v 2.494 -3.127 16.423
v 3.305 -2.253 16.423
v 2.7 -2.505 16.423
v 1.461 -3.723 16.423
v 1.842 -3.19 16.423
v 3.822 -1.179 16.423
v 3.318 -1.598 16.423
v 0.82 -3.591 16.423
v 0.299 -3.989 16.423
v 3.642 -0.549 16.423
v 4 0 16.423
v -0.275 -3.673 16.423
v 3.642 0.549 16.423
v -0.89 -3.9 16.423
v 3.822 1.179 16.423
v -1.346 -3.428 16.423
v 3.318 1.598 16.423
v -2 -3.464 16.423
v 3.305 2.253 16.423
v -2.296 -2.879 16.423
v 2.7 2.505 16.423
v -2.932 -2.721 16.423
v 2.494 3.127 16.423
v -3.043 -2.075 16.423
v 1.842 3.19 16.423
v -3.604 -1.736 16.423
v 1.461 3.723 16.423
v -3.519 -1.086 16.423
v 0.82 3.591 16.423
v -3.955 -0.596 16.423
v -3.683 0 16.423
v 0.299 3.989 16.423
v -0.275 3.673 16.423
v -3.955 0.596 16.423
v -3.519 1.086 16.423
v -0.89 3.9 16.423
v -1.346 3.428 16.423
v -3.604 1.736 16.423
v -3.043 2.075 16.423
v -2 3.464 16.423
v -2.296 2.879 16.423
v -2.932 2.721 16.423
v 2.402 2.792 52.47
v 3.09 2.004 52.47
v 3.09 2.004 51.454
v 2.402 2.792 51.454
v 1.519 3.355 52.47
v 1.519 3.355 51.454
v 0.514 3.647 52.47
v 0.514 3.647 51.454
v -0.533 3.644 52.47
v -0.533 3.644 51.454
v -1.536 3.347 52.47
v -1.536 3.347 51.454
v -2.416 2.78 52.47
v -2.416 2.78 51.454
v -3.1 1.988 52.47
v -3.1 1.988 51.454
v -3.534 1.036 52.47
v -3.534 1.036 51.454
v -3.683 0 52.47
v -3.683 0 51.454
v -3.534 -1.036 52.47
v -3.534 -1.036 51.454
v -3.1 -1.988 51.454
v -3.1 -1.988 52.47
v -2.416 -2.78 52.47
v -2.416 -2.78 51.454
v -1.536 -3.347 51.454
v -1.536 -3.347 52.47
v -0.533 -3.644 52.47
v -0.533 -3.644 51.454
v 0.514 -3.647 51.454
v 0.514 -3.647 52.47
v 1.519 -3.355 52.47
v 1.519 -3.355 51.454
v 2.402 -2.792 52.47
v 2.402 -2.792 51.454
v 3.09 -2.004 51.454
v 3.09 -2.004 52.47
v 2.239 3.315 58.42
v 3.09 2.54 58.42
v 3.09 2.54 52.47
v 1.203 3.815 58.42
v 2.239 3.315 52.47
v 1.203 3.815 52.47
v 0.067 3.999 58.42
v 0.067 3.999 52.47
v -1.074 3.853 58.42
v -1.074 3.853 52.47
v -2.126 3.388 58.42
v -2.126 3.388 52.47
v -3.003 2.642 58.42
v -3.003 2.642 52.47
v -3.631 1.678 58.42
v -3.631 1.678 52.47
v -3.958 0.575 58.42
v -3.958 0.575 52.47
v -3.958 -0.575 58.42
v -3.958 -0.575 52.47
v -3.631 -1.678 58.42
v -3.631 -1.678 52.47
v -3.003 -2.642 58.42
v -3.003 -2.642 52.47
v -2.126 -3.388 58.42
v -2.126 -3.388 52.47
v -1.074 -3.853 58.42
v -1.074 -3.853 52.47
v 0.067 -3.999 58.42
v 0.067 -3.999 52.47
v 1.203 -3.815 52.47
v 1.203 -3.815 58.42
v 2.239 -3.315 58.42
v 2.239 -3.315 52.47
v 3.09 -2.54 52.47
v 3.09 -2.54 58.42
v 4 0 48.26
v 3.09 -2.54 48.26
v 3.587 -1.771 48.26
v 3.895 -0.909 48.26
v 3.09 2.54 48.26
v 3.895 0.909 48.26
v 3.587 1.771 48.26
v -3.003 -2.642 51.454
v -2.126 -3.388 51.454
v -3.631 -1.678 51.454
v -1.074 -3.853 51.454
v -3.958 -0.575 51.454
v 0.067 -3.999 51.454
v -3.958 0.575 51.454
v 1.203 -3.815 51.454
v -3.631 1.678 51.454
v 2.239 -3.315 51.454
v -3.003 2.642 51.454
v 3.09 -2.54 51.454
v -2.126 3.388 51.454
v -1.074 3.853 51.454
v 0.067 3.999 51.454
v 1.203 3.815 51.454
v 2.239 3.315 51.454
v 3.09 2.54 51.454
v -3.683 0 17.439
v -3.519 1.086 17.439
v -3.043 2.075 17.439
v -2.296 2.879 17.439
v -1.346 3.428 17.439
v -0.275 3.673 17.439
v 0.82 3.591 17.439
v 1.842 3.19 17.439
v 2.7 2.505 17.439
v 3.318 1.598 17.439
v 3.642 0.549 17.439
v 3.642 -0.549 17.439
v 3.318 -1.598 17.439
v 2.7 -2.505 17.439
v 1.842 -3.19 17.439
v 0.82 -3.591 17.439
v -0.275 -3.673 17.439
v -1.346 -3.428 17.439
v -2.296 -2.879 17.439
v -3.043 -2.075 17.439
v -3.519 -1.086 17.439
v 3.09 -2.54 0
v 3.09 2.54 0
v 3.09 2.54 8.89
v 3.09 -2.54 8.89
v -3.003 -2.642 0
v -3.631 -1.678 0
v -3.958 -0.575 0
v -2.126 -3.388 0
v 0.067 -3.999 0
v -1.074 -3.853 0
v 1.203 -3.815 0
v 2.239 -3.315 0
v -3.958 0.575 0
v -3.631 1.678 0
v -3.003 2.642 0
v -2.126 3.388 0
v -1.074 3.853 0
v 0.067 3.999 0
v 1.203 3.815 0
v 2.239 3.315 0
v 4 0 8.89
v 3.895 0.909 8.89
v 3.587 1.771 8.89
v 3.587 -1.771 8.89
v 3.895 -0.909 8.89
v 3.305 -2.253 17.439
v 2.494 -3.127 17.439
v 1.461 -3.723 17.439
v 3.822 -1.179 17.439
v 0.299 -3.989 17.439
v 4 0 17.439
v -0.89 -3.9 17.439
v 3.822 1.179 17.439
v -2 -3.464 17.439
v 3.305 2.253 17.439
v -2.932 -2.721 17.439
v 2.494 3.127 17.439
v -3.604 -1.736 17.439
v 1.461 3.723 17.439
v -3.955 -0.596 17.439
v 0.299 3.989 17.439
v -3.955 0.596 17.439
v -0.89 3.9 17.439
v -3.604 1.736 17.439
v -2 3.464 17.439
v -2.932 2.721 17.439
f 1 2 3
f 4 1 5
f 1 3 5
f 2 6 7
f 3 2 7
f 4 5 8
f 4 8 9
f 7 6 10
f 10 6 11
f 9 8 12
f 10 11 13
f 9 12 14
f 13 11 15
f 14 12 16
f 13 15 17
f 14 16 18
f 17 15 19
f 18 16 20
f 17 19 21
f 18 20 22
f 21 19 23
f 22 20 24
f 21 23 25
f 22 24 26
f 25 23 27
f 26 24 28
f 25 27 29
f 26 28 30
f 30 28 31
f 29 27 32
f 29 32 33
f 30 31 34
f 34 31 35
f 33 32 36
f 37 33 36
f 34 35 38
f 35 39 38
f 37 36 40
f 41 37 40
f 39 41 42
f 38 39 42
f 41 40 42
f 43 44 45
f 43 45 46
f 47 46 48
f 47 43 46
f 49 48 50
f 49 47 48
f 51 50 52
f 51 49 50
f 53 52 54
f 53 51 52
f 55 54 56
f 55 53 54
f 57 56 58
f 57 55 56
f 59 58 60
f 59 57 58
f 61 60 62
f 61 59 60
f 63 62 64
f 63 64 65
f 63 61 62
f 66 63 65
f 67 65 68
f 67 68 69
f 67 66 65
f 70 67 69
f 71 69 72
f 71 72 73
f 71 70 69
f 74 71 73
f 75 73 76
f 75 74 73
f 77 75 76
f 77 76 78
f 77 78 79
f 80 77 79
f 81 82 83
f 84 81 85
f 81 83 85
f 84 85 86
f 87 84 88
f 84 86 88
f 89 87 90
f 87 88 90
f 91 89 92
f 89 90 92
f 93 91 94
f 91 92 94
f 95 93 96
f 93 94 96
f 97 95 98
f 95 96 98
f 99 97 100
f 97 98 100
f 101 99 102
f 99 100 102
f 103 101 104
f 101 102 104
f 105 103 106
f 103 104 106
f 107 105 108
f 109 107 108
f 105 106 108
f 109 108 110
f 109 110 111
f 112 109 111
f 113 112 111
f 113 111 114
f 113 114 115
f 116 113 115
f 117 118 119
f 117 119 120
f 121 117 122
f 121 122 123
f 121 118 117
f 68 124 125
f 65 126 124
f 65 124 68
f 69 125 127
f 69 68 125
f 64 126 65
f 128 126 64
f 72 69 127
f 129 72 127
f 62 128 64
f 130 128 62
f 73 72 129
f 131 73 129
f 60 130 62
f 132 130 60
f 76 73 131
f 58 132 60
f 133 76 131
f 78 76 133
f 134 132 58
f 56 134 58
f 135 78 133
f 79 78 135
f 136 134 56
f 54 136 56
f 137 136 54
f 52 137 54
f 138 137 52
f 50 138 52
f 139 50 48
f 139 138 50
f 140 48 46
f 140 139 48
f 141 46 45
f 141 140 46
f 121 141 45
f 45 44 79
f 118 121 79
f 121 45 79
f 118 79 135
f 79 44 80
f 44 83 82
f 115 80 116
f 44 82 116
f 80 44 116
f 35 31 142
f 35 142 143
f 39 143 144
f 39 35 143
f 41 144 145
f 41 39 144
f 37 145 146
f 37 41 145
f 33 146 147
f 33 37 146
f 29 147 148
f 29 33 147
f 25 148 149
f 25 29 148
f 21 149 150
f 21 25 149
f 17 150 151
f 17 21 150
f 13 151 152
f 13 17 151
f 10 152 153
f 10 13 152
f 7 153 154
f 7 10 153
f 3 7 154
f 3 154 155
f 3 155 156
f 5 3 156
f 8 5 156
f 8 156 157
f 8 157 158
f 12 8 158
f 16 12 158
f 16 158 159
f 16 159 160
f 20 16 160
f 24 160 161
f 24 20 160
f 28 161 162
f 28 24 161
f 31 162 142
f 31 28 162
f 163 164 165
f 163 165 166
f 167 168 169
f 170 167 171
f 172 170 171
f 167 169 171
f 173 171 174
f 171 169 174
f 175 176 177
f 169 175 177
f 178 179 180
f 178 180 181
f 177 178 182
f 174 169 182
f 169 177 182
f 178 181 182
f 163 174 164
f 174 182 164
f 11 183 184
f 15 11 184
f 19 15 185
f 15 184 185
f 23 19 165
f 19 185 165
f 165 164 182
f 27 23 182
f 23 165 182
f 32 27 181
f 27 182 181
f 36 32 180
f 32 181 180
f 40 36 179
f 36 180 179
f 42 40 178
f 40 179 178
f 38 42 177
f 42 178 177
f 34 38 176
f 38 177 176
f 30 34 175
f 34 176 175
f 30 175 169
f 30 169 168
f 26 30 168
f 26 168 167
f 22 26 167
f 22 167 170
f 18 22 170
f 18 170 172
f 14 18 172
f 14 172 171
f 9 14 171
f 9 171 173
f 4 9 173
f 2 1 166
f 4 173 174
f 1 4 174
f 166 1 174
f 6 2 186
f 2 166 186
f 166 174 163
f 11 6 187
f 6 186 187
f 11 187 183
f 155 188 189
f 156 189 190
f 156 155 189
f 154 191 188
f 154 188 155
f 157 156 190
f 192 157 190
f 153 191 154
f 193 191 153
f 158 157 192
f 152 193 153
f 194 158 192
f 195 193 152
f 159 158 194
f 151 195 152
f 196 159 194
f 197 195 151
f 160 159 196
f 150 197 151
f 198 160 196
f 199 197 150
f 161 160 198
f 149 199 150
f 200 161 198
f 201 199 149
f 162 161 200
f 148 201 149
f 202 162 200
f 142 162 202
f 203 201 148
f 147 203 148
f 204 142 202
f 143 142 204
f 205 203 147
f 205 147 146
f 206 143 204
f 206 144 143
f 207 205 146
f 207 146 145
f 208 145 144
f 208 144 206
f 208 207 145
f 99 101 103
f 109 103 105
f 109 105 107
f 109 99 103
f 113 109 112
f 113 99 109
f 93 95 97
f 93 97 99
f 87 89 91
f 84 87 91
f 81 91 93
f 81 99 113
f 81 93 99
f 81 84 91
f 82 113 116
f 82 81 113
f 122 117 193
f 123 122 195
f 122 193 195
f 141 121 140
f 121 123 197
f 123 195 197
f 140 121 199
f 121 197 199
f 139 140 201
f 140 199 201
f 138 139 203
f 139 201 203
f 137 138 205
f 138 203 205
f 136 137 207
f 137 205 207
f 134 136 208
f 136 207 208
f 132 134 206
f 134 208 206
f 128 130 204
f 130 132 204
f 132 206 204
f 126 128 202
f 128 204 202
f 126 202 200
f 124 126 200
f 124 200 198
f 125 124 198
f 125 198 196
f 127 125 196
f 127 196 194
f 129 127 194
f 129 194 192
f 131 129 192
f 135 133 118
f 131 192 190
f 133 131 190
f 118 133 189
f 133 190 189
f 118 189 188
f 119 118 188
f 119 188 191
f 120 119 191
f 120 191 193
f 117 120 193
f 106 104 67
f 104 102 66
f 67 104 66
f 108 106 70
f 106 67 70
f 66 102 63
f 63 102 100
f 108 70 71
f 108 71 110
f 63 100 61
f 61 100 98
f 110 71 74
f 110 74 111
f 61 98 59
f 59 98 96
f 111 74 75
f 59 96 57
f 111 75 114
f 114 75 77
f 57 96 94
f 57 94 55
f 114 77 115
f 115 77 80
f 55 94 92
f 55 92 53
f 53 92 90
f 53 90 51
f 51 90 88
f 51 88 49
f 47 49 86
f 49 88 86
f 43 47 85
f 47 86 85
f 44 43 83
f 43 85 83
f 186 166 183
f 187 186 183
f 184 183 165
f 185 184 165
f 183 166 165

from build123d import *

# Parameters (mm, degrees)
SKETCH1_R           = 4.000000001
BOSS_EXTRUDE1_DEPTH = 58.42
CUT_EXTRUDE1_DEPTH  = 10.16
CUT_EXTRUDE5_DEPTH  = 8.89
CUT_EXTRUDE3_START  = -16.423386
SKETCH4_OUTSIDE_W   = 21.902
SKETCH4_OUTSIDE_H   = 21.902
SKETCH4_OUTSIDE_R   = 3.683
CUT_EXTRUDE3_DEPTH  = 1.016
CUT_EXTRUDE4_START  = -5.94995
SKETCH5_OUTSIDE_W   = 21.902
SKETCH5_OUTSIDE_H   = 21.902
SKETCH5_OUTSIDE_R   = 3.683
CUT_EXTRUDE4_DEPTH  = 1.016


with BuildPart() as part:
    # Sketch1 → Boss-Extrude1 (new body)
    with BuildSketch(Plane.XY):
        Circle(SKETCH1_R)
    extrude(amount=BOSS_EXTRUDE1_DEPTH)

    # Sketch2 → Cut-Extrude1 (cut)
    with BuildSketch(Plane.XY.offset(58.42)):
        with BuildLine():
            Line((3.090048545, 2.54), (3.090048545, -2.54))
            ThreePointArc((3.090048545, -2.54), (4.000000001, 0), (3.090048545, 2.54))
        make_face()
    extrude(amount=-CUT_EXTRUDE1_DEPTH, mode=Mode.SUBTRACT)

    # Sketch6 → Cut-Extrude5 (cut)
    with BuildSketch(Plane(origin=(0, 0, 0), x_dir=(-1, 0, 0), z_dir=(0, 0, -1))):
        with BuildLine():
            Line((-3.090048545, 2.54), (-3.090048545, -2.54))
            ThreePointArc((-3.090048545, -2.54), (-4.000000001, 0), (-3.090048545, 2.54))
        make_face()
    extrude(amount=-CUT_EXTRUDE5_DEPTH, mode=Mode.SUBTRACT)

    # Sketch4 outside → Cut-Extrude3 (cut)
    with BuildSketch(Plane(origin=(0, 0, 0), x_dir=(-1, 0, 0), z_dir=(0, 0, -1)).offset(CUT_EXTRUDE3_START)):
        Rectangle(SKETCH4_OUTSIDE_W, SKETCH4_OUTSIDE_H)
        Circle(SKETCH4_OUTSIDE_R, mode=Mode.SUBTRACT)
    extrude(amount=-CUT_EXTRUDE3_DEPTH, mode=Mode.SUBTRACT)

    # Sketch5 outside → Cut-Extrude4 (cut)
    with BuildSketch(Plane.XY.offset(58.42).offset(CUT_EXTRUDE4_START)):
        Rectangle(SKETCH5_OUTSIDE_W, SKETCH5_OUTSIDE_H)
        Circle(SKETCH5_OUTSIDE_R, mode=Mode.SUBTRACT)
    extrude(amount=-CUT_EXTRUDE4_DEPTH, mode=Mode.SUBTRACT)


solid = part.part
